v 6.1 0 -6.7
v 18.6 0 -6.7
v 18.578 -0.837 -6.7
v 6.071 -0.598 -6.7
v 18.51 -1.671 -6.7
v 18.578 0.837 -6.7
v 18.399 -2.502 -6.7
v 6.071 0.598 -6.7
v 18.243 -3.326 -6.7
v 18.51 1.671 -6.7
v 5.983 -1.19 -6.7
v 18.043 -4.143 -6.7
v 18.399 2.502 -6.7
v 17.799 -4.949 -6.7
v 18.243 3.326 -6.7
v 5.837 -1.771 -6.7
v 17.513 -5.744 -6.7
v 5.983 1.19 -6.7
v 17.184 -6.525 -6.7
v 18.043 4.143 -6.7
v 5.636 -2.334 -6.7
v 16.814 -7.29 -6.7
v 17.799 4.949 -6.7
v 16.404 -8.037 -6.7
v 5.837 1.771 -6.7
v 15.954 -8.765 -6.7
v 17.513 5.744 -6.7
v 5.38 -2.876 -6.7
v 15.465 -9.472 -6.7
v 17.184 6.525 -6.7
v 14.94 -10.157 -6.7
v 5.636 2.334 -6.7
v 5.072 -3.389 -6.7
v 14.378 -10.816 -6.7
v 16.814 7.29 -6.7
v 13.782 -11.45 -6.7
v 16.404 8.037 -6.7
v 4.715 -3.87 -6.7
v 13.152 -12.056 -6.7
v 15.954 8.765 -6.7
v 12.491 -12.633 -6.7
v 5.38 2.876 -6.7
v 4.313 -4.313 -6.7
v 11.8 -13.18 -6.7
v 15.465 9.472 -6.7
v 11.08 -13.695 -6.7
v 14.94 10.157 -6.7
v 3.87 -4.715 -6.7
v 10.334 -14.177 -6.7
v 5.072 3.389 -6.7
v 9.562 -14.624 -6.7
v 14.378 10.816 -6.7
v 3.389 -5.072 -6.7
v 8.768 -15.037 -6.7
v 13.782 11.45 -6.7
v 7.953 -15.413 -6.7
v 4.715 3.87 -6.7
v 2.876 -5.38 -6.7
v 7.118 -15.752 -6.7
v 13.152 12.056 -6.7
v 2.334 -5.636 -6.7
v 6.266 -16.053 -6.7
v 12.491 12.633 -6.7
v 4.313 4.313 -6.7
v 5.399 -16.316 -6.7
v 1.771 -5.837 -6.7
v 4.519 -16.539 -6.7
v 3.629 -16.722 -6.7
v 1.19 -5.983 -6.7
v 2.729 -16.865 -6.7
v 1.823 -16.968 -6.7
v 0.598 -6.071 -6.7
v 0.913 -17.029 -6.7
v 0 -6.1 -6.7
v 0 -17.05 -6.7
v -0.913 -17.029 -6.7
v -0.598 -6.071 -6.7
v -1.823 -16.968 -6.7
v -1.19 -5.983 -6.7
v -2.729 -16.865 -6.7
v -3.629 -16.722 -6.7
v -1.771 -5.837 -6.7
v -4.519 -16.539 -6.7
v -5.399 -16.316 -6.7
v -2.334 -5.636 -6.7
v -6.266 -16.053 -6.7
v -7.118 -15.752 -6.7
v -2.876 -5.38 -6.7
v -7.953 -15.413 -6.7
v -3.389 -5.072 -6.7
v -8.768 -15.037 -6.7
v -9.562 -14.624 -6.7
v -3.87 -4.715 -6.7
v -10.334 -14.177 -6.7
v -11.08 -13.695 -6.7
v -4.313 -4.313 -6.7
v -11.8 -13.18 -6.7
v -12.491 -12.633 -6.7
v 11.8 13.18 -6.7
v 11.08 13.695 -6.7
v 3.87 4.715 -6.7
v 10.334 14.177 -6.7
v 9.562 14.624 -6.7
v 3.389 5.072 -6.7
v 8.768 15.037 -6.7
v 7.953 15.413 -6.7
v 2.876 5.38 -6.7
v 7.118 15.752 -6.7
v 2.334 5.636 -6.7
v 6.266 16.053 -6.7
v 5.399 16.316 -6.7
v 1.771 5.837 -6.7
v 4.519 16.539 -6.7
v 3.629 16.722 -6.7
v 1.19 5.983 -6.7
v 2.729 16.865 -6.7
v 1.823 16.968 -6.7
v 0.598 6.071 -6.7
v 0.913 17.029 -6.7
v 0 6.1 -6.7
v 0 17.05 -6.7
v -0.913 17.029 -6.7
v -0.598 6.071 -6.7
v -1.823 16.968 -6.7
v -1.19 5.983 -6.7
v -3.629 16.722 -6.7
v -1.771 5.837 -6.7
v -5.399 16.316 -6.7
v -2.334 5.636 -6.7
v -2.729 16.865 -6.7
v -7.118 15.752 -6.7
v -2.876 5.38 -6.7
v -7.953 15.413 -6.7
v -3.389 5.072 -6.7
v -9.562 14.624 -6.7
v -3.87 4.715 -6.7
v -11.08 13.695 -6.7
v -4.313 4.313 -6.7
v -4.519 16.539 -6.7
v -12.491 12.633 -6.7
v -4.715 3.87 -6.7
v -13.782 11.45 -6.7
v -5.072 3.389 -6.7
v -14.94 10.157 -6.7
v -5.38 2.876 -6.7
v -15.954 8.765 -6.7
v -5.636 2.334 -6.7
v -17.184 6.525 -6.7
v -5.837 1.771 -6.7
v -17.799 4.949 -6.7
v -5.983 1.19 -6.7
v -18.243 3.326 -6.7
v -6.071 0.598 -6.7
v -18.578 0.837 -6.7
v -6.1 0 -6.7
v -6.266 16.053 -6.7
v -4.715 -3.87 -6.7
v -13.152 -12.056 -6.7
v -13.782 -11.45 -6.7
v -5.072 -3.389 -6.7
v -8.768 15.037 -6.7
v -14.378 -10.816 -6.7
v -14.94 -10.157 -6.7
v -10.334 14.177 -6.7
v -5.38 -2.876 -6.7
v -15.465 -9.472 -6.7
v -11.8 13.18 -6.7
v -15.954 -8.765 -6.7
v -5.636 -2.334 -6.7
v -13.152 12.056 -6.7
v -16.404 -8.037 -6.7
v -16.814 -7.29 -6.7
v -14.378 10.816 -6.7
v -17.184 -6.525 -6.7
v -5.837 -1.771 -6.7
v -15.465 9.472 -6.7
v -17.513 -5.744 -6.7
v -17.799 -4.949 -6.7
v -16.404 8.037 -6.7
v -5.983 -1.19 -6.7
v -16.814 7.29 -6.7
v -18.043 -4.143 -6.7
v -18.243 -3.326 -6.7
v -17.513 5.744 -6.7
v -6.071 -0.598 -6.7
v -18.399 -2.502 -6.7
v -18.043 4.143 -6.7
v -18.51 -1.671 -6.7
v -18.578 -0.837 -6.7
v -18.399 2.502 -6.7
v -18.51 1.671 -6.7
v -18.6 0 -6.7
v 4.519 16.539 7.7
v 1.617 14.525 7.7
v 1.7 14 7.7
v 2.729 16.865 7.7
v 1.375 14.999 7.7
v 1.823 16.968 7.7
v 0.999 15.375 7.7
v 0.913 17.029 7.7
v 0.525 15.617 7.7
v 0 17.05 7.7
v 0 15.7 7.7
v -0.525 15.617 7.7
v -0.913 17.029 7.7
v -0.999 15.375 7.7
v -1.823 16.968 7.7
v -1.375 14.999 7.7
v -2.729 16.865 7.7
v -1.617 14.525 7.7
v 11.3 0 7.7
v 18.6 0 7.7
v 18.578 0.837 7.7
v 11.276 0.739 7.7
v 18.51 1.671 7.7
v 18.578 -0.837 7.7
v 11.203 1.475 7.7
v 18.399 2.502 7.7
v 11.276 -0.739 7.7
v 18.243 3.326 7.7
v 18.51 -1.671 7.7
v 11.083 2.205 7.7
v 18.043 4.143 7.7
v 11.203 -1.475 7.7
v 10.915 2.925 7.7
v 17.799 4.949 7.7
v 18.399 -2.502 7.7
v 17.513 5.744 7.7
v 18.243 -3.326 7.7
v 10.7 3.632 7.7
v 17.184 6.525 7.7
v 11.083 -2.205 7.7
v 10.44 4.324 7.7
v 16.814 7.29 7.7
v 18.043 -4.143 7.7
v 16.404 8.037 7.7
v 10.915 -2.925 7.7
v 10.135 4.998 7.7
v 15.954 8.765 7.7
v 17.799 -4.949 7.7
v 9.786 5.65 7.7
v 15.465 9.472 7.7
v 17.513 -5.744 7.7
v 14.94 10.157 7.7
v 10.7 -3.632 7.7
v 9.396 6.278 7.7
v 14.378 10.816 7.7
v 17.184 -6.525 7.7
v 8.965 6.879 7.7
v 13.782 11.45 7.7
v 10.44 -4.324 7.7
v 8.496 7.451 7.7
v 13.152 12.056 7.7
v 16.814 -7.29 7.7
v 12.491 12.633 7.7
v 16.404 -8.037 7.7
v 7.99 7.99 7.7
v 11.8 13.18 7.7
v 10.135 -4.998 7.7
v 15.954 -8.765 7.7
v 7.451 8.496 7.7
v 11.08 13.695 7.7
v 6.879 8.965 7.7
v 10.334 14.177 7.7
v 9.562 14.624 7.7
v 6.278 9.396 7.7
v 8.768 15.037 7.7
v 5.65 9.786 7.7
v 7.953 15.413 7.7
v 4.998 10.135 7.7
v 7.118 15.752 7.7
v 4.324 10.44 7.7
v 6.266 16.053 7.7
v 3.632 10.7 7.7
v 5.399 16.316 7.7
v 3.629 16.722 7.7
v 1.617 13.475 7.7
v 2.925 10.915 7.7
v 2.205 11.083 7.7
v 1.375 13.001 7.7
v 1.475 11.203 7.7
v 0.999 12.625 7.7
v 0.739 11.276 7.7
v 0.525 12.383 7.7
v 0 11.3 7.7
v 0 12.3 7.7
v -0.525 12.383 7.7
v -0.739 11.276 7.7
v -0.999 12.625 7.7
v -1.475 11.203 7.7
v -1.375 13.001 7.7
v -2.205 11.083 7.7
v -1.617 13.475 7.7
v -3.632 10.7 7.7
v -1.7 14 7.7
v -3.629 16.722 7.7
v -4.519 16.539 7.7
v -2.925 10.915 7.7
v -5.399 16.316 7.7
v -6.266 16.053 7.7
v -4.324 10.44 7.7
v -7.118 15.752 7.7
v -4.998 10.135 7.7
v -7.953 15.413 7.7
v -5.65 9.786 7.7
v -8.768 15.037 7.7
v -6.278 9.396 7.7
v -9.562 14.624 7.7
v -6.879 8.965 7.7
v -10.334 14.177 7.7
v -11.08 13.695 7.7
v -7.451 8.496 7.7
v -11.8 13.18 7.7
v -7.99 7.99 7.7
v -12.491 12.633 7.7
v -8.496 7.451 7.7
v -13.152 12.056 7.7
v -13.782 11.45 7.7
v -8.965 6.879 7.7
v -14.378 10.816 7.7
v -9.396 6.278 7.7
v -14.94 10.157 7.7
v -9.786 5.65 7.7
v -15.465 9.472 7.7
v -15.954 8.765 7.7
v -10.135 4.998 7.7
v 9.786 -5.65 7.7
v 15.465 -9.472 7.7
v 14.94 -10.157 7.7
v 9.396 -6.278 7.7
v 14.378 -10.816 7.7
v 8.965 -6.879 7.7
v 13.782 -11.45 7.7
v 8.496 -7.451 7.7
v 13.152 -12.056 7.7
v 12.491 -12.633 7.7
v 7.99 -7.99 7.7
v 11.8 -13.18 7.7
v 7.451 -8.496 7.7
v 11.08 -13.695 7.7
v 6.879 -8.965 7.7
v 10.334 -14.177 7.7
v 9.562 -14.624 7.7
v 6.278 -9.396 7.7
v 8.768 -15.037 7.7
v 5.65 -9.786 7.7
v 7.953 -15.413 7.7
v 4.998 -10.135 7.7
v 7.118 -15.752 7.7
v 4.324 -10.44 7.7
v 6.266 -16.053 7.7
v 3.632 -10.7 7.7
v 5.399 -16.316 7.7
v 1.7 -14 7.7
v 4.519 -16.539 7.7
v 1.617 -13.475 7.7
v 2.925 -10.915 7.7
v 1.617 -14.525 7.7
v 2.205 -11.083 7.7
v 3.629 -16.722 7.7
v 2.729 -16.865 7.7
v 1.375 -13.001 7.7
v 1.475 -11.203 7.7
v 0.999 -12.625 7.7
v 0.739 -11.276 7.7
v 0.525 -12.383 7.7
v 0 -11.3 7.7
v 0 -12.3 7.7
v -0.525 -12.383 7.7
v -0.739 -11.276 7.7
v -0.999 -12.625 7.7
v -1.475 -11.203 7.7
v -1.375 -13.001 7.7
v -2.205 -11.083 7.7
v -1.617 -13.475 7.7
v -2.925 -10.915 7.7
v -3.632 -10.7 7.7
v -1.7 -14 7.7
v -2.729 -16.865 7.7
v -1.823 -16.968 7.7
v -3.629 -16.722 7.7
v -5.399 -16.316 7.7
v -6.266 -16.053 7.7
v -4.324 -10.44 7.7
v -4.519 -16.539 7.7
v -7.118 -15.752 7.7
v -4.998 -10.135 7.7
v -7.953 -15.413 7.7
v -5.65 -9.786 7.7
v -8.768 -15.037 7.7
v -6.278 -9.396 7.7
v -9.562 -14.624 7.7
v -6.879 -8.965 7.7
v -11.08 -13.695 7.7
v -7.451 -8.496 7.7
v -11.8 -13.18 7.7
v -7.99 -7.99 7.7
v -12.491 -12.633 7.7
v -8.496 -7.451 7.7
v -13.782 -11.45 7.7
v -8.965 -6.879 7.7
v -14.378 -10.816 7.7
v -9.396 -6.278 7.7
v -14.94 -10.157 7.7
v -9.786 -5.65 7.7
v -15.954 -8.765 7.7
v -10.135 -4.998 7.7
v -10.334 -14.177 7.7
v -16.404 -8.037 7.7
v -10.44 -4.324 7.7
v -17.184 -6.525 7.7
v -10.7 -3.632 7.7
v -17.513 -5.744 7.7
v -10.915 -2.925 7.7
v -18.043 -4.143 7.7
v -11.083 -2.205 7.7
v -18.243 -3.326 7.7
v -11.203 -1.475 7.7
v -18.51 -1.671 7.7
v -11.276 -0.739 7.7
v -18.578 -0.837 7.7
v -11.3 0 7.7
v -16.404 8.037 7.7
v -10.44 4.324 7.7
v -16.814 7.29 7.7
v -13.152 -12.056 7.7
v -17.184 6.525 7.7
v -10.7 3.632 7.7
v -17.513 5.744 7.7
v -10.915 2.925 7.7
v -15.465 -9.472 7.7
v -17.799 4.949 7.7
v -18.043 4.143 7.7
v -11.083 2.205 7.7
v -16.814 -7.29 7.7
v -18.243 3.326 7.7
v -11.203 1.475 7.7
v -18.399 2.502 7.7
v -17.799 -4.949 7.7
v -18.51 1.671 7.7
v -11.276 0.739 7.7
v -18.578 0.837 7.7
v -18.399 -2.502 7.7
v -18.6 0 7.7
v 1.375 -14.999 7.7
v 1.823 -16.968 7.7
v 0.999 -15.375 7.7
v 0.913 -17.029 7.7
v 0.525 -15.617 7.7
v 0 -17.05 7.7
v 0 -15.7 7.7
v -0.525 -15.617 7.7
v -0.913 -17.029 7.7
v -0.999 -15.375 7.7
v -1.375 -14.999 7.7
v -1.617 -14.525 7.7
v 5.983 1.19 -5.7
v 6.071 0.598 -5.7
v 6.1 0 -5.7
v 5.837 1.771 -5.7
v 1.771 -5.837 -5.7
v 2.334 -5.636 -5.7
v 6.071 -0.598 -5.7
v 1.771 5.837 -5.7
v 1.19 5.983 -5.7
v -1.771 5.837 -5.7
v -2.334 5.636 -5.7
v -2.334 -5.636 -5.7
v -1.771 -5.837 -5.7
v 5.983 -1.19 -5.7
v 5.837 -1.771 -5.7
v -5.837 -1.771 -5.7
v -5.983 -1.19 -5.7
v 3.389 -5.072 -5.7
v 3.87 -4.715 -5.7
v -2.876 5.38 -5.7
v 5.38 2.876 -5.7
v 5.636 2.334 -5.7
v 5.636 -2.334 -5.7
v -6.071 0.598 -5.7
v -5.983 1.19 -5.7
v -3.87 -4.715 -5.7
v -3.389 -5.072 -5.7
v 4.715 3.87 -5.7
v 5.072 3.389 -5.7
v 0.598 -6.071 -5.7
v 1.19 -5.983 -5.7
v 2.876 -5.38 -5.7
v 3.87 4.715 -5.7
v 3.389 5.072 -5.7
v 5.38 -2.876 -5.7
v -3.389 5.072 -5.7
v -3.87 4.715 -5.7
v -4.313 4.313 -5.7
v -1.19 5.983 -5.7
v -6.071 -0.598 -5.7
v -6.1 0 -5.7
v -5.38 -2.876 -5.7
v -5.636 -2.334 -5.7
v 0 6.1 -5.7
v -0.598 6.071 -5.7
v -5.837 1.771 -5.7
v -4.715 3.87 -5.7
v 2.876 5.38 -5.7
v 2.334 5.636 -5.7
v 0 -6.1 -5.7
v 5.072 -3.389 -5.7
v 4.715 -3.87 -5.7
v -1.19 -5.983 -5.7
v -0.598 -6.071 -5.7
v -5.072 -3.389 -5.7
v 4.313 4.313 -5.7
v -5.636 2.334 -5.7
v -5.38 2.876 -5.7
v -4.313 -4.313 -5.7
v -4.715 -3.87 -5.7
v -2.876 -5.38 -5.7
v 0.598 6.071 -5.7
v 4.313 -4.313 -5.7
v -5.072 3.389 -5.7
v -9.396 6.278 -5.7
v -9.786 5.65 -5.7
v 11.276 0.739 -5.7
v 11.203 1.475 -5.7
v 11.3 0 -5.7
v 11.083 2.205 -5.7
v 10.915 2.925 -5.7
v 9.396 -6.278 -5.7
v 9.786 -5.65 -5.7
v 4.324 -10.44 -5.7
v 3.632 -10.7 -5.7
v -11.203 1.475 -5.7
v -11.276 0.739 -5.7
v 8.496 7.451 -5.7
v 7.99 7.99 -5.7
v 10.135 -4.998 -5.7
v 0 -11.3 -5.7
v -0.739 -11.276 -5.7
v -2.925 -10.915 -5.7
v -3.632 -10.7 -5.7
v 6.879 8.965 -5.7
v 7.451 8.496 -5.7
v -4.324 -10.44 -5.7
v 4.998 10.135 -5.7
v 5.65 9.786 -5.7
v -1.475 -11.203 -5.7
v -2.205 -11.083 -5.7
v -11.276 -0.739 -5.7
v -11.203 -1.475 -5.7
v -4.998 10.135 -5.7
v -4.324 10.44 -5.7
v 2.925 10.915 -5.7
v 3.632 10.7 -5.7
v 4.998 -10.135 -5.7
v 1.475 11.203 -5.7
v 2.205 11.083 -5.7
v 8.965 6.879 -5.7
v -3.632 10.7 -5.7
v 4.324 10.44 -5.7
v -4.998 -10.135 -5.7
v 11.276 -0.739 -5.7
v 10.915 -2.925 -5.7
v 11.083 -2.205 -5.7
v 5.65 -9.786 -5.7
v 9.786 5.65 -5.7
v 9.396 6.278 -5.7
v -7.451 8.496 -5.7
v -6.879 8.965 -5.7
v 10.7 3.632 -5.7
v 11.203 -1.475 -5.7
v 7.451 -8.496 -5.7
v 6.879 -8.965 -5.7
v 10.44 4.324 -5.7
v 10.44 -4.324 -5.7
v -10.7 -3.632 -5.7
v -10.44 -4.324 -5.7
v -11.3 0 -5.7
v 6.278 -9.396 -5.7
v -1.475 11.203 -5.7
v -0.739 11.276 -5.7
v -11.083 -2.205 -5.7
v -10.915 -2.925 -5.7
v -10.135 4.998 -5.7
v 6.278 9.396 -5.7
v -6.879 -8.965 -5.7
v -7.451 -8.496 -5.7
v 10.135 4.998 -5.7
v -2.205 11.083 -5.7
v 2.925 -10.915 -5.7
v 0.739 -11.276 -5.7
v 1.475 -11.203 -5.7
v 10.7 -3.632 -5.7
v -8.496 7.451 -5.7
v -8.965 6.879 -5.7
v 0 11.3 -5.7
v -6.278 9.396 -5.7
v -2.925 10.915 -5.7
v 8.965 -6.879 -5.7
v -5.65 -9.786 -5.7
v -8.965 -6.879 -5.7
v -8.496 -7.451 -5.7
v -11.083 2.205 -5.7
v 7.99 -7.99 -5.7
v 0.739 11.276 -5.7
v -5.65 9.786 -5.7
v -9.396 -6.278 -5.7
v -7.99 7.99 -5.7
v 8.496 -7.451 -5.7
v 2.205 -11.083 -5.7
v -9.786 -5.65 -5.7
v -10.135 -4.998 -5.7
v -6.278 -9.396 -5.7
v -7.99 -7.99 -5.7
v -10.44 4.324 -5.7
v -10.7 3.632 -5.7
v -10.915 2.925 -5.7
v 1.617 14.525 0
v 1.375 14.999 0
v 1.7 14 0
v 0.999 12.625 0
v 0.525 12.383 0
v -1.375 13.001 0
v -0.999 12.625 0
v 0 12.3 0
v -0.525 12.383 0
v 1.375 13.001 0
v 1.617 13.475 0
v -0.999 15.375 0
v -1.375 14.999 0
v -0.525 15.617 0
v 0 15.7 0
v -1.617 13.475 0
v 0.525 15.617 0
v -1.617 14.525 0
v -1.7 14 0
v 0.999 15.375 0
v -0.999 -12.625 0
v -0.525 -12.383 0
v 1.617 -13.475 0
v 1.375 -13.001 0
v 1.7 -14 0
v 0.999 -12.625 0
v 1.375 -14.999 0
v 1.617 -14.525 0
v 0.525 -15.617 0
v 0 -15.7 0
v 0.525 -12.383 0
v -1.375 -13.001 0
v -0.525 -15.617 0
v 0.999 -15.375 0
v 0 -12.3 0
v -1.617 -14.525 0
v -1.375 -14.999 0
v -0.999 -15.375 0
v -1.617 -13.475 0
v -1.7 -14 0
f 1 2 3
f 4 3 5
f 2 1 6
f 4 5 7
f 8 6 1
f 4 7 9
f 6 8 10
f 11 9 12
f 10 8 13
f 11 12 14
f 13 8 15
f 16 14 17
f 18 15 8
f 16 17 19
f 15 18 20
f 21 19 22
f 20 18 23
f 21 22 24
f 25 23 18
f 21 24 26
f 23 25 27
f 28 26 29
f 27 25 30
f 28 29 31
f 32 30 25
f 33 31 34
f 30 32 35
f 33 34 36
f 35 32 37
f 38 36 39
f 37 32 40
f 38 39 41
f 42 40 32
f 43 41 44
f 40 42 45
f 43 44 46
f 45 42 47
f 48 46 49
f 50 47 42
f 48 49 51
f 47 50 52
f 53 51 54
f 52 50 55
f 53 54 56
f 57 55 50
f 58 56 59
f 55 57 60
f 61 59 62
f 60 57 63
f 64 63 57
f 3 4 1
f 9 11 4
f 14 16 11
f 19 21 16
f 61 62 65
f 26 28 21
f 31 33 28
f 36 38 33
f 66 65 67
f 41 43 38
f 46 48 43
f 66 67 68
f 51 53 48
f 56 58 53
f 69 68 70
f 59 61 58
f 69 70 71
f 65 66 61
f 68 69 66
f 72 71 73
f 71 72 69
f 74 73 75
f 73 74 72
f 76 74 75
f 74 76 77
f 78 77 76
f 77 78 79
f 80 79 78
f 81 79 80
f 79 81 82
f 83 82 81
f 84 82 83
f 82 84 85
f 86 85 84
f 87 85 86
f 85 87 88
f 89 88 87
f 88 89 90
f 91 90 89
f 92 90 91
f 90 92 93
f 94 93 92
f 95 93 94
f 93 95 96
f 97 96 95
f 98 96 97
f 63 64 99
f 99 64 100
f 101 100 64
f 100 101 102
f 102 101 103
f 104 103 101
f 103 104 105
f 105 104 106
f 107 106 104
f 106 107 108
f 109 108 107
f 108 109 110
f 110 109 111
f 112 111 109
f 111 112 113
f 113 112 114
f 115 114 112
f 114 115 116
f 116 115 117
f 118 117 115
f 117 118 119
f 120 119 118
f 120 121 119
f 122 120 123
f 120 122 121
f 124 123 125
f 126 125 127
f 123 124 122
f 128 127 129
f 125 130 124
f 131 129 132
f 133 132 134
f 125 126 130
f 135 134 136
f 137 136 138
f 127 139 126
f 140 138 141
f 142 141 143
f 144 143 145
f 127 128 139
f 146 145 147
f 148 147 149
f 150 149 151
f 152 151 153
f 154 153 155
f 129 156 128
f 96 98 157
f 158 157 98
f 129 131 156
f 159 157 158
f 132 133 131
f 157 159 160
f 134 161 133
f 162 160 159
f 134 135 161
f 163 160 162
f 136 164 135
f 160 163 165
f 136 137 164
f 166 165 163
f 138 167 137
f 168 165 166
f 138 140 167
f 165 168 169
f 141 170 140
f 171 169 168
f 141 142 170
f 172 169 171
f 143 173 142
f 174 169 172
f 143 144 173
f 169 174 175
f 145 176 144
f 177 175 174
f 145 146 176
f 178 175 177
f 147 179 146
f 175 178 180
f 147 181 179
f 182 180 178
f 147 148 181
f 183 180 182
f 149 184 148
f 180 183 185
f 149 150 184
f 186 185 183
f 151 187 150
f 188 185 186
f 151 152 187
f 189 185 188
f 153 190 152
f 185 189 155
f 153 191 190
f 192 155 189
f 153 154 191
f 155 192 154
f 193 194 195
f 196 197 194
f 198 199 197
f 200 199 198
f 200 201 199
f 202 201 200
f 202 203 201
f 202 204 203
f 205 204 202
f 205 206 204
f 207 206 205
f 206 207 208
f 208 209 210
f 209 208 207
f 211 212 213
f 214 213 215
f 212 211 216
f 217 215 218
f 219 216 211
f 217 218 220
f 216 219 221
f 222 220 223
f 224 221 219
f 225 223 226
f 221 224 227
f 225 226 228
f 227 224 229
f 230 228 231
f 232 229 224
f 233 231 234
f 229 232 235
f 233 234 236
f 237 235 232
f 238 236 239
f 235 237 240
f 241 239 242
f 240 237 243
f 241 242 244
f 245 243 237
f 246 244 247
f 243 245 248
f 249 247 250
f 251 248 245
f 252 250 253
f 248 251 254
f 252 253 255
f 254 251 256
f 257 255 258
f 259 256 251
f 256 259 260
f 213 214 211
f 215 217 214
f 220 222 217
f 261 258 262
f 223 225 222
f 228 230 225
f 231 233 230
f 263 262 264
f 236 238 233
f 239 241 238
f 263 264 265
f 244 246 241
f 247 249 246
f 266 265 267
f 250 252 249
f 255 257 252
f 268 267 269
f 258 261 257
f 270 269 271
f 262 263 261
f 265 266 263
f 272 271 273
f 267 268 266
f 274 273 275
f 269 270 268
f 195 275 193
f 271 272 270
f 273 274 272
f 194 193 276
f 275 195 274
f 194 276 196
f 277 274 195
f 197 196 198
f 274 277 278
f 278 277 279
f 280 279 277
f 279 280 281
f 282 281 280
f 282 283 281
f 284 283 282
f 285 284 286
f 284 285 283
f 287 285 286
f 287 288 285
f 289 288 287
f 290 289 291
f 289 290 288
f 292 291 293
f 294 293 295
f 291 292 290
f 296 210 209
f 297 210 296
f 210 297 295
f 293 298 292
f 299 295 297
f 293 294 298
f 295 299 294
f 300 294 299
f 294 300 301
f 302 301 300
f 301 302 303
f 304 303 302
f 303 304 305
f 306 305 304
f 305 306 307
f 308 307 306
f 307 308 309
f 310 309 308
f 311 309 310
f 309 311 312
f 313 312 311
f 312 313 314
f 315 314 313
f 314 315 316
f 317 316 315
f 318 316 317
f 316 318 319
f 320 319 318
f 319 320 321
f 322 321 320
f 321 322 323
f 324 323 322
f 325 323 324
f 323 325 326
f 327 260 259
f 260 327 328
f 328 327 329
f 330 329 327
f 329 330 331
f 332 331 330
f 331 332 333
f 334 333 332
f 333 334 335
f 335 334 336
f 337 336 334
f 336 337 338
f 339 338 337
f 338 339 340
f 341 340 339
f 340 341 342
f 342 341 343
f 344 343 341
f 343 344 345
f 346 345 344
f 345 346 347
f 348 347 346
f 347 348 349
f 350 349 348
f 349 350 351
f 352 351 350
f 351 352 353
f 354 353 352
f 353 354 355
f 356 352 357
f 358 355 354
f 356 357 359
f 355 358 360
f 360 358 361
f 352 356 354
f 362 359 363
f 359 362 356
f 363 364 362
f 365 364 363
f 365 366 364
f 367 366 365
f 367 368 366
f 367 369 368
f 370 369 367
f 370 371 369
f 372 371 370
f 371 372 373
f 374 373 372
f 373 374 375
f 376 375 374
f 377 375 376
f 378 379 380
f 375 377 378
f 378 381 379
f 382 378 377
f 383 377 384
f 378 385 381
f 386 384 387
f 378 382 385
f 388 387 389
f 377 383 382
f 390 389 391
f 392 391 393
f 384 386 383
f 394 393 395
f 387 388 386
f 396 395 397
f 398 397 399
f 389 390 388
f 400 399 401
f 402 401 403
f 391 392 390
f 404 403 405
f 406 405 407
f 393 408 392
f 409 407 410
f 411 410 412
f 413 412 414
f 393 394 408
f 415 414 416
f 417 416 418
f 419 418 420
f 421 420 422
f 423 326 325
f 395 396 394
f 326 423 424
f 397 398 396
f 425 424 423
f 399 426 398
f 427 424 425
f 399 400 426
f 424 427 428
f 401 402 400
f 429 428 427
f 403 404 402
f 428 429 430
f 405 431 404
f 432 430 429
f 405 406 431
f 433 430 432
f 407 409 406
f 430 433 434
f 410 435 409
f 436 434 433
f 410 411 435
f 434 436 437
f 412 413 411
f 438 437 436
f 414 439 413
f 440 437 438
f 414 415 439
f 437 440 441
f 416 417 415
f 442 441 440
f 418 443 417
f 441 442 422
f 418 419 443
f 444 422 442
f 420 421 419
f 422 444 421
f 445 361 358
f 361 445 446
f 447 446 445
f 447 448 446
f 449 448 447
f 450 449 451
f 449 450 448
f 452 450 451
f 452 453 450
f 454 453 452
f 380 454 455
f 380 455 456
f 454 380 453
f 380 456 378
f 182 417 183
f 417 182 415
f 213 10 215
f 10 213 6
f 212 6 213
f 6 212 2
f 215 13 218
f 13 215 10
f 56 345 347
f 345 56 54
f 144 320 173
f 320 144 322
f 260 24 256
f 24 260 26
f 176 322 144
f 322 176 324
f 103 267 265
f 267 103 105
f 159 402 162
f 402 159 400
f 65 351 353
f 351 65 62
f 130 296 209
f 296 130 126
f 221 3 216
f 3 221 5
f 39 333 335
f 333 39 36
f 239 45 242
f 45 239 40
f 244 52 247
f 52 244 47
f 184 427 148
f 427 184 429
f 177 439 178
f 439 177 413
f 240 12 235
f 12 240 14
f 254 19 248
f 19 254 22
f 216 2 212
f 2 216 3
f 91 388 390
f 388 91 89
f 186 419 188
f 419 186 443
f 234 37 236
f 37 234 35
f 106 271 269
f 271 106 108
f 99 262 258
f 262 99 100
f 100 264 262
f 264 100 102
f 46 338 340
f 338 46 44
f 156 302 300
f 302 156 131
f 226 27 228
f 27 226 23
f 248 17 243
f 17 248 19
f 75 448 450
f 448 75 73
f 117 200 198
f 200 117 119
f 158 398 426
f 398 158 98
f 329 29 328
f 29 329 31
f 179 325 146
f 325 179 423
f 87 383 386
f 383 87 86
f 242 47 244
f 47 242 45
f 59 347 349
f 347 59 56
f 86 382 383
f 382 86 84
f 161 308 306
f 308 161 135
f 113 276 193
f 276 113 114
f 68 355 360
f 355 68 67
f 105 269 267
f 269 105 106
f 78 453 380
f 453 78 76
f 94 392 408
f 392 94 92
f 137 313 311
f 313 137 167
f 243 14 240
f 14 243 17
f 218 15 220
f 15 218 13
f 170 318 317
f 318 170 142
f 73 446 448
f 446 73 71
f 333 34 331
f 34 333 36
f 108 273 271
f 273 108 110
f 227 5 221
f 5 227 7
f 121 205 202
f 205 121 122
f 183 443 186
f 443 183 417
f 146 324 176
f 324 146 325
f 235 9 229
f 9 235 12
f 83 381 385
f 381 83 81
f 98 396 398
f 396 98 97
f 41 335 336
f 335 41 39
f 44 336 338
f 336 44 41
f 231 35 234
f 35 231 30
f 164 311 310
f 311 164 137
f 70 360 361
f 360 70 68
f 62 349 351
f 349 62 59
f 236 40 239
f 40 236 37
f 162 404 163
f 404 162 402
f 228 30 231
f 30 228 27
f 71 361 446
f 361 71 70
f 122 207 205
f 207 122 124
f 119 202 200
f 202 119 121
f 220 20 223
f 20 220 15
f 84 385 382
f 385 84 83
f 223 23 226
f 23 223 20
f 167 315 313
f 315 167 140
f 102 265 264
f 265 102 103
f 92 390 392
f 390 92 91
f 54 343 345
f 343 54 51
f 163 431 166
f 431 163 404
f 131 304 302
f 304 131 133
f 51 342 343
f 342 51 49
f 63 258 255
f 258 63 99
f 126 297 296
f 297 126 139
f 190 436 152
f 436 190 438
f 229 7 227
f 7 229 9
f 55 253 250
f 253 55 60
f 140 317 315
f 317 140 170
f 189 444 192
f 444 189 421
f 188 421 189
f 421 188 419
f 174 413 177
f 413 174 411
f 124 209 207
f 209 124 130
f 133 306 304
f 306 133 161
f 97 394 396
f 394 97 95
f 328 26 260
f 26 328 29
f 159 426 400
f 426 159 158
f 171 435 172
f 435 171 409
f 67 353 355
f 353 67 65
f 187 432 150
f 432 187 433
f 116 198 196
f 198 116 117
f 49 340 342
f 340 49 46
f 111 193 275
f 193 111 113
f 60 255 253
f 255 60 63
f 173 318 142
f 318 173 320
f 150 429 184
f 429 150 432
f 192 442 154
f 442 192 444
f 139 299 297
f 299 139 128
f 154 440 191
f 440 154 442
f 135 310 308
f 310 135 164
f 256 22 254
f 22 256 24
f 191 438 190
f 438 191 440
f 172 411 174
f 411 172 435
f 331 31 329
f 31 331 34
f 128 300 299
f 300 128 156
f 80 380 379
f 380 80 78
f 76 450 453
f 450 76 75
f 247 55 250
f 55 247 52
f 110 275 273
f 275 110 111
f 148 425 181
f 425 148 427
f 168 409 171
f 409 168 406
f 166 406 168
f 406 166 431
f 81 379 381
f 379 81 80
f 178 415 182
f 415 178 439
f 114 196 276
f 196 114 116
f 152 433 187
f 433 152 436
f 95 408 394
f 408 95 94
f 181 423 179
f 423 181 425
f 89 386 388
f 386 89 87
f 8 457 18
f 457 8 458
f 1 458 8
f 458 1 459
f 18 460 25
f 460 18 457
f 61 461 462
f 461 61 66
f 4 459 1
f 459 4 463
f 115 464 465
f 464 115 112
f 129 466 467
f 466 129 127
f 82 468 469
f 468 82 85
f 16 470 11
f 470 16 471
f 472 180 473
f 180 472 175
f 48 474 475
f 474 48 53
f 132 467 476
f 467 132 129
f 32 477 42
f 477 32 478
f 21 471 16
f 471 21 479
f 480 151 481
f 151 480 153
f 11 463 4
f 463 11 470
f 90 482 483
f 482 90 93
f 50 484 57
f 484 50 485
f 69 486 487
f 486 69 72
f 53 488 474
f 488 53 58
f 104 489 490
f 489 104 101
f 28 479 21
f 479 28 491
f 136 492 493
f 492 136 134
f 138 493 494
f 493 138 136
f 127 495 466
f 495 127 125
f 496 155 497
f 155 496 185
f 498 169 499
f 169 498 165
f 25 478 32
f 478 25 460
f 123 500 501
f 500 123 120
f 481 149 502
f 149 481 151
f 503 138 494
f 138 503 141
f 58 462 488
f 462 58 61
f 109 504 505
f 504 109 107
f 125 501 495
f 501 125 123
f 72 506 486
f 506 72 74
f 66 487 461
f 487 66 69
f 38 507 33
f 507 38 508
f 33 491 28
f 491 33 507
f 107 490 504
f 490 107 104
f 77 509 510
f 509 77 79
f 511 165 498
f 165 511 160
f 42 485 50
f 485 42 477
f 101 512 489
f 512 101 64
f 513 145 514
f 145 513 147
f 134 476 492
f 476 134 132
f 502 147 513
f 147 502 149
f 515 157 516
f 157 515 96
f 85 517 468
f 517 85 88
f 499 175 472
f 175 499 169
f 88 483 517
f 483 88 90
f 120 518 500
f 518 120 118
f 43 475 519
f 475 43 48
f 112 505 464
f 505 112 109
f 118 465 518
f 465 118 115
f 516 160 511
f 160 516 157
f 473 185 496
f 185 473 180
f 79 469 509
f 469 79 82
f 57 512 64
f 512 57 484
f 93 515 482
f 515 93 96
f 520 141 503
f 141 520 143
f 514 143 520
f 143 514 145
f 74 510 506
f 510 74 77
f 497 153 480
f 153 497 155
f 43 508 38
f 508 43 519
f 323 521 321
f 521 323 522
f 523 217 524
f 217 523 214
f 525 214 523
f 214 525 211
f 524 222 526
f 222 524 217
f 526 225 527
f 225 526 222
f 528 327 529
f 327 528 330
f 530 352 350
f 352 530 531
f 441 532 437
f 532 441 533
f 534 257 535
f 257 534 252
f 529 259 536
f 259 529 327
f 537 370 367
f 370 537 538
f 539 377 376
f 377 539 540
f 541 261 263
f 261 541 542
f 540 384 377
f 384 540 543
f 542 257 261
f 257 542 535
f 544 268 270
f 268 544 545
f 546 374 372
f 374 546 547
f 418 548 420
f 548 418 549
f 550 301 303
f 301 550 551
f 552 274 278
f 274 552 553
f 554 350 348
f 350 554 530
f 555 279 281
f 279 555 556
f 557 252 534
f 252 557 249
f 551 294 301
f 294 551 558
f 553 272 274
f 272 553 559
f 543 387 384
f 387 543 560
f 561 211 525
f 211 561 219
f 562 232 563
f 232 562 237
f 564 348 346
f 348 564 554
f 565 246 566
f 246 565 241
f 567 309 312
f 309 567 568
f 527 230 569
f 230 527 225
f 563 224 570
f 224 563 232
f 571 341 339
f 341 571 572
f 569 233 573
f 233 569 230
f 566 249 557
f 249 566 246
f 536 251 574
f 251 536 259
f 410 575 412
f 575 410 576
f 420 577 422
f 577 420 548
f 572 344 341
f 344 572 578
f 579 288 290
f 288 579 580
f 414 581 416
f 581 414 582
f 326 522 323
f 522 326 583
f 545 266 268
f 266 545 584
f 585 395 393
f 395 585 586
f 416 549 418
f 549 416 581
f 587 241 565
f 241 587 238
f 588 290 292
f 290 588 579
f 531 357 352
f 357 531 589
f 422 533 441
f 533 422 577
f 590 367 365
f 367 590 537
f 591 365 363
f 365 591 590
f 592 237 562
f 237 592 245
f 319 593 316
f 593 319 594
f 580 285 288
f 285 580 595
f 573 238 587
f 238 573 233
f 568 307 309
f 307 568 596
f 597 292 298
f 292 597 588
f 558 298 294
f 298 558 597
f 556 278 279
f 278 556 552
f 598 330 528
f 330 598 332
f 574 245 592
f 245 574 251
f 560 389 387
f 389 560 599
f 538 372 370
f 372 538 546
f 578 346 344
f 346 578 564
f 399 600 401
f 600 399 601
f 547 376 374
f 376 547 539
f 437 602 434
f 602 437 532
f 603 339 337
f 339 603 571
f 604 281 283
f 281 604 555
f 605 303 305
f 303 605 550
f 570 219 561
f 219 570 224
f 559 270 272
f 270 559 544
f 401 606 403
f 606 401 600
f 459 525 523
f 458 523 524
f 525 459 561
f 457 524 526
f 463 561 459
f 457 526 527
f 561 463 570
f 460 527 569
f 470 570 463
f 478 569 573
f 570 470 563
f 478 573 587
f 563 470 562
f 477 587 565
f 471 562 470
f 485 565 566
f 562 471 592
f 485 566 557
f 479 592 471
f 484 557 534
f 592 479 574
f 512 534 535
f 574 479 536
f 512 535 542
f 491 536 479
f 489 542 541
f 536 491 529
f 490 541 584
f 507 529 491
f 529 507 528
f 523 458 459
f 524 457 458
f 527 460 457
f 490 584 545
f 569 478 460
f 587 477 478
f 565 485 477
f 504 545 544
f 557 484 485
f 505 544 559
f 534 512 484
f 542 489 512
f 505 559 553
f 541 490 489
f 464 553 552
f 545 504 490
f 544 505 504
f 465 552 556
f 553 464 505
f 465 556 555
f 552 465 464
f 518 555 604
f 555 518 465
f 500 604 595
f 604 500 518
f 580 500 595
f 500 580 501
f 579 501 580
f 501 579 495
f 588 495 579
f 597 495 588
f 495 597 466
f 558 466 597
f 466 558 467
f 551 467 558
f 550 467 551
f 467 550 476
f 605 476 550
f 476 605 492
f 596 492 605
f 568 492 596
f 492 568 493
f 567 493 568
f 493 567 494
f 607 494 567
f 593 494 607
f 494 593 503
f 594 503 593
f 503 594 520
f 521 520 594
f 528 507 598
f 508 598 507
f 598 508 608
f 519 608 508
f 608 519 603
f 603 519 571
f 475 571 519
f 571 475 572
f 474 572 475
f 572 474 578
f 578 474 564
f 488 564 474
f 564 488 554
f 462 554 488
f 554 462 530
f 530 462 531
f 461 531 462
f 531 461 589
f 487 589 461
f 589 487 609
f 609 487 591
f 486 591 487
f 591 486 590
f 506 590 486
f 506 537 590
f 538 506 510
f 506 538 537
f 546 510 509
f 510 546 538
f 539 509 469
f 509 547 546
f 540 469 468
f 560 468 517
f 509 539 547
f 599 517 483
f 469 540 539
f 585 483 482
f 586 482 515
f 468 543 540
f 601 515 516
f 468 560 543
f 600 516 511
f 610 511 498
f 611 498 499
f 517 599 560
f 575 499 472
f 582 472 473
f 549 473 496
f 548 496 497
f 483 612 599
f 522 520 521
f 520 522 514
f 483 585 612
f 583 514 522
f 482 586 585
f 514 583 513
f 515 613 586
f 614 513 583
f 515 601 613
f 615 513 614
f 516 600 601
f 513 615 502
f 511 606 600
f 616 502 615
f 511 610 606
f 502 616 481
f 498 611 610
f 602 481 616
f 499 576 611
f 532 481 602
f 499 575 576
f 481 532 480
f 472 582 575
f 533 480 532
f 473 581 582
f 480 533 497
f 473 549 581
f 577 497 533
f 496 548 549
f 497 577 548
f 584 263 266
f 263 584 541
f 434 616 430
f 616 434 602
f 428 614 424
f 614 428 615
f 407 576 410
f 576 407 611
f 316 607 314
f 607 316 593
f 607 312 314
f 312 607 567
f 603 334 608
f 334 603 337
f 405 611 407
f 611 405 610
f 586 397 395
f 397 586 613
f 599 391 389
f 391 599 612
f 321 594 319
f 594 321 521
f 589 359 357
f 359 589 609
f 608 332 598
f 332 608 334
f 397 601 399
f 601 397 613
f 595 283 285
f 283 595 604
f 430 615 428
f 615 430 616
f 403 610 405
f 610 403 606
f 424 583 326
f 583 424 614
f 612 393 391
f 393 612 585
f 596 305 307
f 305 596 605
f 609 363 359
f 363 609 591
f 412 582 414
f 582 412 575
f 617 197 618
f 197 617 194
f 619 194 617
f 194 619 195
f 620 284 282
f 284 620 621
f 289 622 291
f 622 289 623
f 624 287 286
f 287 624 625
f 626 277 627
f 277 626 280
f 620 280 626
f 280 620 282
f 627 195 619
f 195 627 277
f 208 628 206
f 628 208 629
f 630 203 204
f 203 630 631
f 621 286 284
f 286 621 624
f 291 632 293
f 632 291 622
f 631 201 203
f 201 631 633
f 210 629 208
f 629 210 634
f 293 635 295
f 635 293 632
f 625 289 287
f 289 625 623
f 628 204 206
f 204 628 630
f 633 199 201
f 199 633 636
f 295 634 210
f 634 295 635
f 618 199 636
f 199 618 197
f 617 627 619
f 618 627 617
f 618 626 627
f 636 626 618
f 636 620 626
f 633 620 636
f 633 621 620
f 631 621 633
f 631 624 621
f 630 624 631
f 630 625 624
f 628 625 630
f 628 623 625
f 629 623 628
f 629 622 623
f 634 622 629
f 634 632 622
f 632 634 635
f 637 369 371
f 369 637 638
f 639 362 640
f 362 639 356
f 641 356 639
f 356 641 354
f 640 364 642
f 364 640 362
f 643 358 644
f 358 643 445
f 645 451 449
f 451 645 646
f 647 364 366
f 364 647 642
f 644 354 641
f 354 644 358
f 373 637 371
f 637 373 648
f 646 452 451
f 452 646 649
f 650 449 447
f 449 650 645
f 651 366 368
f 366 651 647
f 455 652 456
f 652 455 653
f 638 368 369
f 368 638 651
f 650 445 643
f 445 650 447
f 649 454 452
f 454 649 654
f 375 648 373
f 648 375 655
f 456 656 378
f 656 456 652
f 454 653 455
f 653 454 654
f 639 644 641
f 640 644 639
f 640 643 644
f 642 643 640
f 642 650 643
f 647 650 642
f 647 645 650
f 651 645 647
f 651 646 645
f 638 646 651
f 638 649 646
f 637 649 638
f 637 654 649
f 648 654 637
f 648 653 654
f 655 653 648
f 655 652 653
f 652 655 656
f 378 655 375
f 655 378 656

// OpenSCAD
// file: inside_tracker.scad
$fn=32;
sleeve_height=57;
sleeve_inside=29;
sleeve_wall=4.8;
sleeve_outside=sleeve_inside+sleeve_wall;
s=8;
q=10;
lvl1 = 24;
lvl2 = 52;
include <MCAD/regular_shapes.scad>;


digmap = [[1, lvl1, 0], [2, lvl1, -s], [3, lvl1-s , -s], [4, lvl1-s-s ,s], [5, lvl1-s, s], [6, lvl1, 0] ];

airmap = [[1,lvl2,-q], [2, lvl2-q, -q], [3, lvl2-2*q, 0], [4, lvl2-2*q , 0], [5, lvl2-2*q ,q], [6, lvl2-q, q]];


// burrower is to be used 6 times, one on each section to make a circle-groove
module burrower (degrees=360/6, 
					section_num=0,		// passed in for echo debug
					upndown=0, 			// ie -20, 0, 20 - relative rise / fall
					currentline=20, 		// starting z-level
					radius=sleeve_inside-1, 				// of can
					quant=60, 				// how many cuts/section
					bulge=3.5,				// radius of cutter-sphere
					huck=36,				// fine-ness of cutter '$fn'
					){
		echo("currentline = ", currentline, " section = ", section_num);
		for (i=[0 : degrees/quant : degrees - (degrees/quant)*.5]){
			rotate([0, 0, i])
			translate([radius, 0, currentline - upndown*cos(i/degrees*180)*.5 + upndown/2])
                //rotate([sin(i+degrees/quant)/sin(i)*i, cos(i+degrees/quant)/cos(i)*i, 0])
                //rotate([90,sin(i+degrees/quant)/sin(i)*i, cos(i+degrees/quant)/cos(i)*i])
                rotate([90,90, 0])
                cylinder(r=bulge,
                         h=2*(radius+bulge+.1)*3.141592654/(360/degrees)/quant, center=true, $fn=huck);
                //rotate([i/6,i/6,60 ])
                //linear_extrude(height=bulge, center=true, scale=[cos(i+degrees/quant)/cos(i), sin(i+degrees/quant)/sin(i),1])
				    //square([bulge*2,bulge*2], center=true);
		}
}

module digdug (sections=6, instructions=digmap){
	for (shovel=instructions){
	rotate([0,0,(shovel[0]-1)*(360/sections)]){
		if (shovel[0] < 3){
			burrower(currentline=shovel[1], 
						section_num=shovel[0], upndown=shovel[2]);
			echo("section ",shovel[0]," is done");
		}
		else {
			burrower(currentline=shovel[1], 
						section_num=shovel[0], upndown=shovel[2]);
		}
	}
	}
}

//digdug();

module sleeve(outside_r=sleeve_inside+sleeve_wall, 
				inside_r=sleeve_inside,
				ht=sleeve_height){
	echo("outside_r=",outside_r, 
				"inside_r=",inside_r,
				"ht=",ht);
	difference(){
		cylinder(r=outside_r, h=ht, center=true, $fn=256);
		cylinder(r=inside_r, h=ht+.1, center=true, $fn=256);
	}
}

// make a sleeve with all the extra parts so it can be diff'd with the tubes lastly
module turnypart(mid=sleeve_height/2, saturn=10, ringthick=1){
	translate([0,0,mid])
        union(){
            // main tube
            rotate_extrude(convexity=10, center=true, $fn=128){
                translate([sleeve_inside, 0, mid])
                    polygon(points=[[0,0],
                            [0, mid],
                            [1, mid],
                            [1 + 4.36/2, mid - 4.36/2],
                            [4.36, mid],
                            [5.36, mid],
                            [10, mid - 10],
                            [10, mid - 11],
                            [9, mid - 11],
                            [4, mid - 16],
                            [5.3, mid - 17.5],
                            [4, mid - 19],
                            [4, -mid],
                            [0, -mid]]);
            //sleeve(outside_r=sleeve_outside+ringthick, inside_r=sleeve_outside-.1, ht=saturn);
            }
        // outside tracks for bearings
        //translate([0,0,mid])
        //    sleeve(outside_r=sleeve_outside+1, inside_r=sleeve_outside+.4, ht=7.1);
        //translate([0,0,mid])
         //   sleeve(outside_r=sleeve_outside+.41, inside_r=sleeve_outside, ht=6.4);
        }

}
//turnypart();

module turn_n_burn(){
// for printing/modeling the whole thing
    difference(){
        turnypart();
	    digdug();
	    digdug(instructions=airmap);
    }
translate([0,0,sleeve_height/2+11]) rotate([0,180,0])
    import("whiskers_big.stl");
}
rotate([180,0,0])
turn_n_burn();
// main file
// plates for rotate-on-shaft idea + openbeam

holespace = 60;
bearingD = 22;
beamside = 15;
// location off-center shaft of beam-hole
db = (holespace + bearingD + beamside) / 2;

cb = 35+ beamside/2;  // shaft center to 608 runners mount-point - a radius of sorts

bigRad = pow((cb*cb) + (db*db), 0.5) + beamside /2;
echo("bigrad = ", bigRad);

use <inside_tracker.scad>;
use <innerds.scad>;
//beamstub();

//pieplate();

//sliphold();
608hold();

module beamstub(ht=30){
    linear_extrude(height=ht)
        import("/home/suber1/Open_Beam_corner_plate_with_optional_foot/Printable_Openbeam/openbeam.dxf");
}

module pieplate(thk=7){
    difference(){
    cylinder(r=bigRad, h=thk, $fn=128, center=true);
        for (i=[1, 0, -1], j=[1,-1]){
            translate([i*db, cb*j, -5])
                scale([1.09,1.09,1])
                    beamstub(ht=30);
            translate([i*db, cb*j, -5])
                scale([0.93,0.93,1])
                    beamstub(ht=30);
            translate([i*db, cb*j, -5])
                scale([1.02,1.02,1])
                    beamstub(ht=30);
        }
        translate([0, 0, -1]){
            cylinder(r=11.1, h=7, $fn=64, center=false);
            cylinder(r=6, h=20, $fn=36, center=true);
        }
        for (i=[0,1]){
        //mirror([0,i,0])
        //    translate([0,cb - beamside, 4]) rotate([-180,90,0])
         //       rotate([0,0,-90])
         //           #cbar(barH=115);
        mirror([i,0,0])
            translate([cb-beamside,6.5,4]) rotate([-180, 180,0])
                #cbar(barH=50);
        }
    }
}


module sliphold(iR=6.1, oR=26.5/2, surround=31/2, h=4.2*2){
    difference(){
        cylinder(r=surround, h=h, $fn=128, center=true);
        cylinder(r=iR, h=h+0.1, $fn=64, center=true);
        cylinder(r=oR, h=h/2+0.1, $fn=96, center=false);
    }
}

module 608hold(iR=6.1, oR=22.6/2, surround=31/2, h=4.2*2, bh=7.2){
        difference(){
        translate([0,0,.5]) union(){
            cylinder(r=surround, h=h+6, $fn=128, center=true);
            scale([1.2,1.1,1])
                cylinder(r=surround, h=h+6, $fn=128, center=true);
        }
        cylinder(r=iR, h=h+5+0.1, $fn=64, center=true);
        translate([0,0,-(h+3)/2])
            cylinder(r=oR, h=50, $fn=96, center=false);
            translate([0,14, 0])
                cylinder(r=1.7, h=50, $fn=20, center=false);
            translate([0,-14, 0])
                cylinder(r=1.7, h=50, $fn=20, center=false);
            translate([-oR-15,0, h+2.5]) rotate([0,90,0])
                scale([1.12,1.12,1])
                    beamstub(ht=80);
            translate([-oR-15,0, h+2.5]) rotate([0,90,0])
                scale([0.90,0.90,1])
                    beamstub(ht=80);
            translate([-oR-15,0, h+2.5]) rotate([0,90,0])
                scale([1.02,1.02,1])
                    beamstub(ht=80);
    }
}
